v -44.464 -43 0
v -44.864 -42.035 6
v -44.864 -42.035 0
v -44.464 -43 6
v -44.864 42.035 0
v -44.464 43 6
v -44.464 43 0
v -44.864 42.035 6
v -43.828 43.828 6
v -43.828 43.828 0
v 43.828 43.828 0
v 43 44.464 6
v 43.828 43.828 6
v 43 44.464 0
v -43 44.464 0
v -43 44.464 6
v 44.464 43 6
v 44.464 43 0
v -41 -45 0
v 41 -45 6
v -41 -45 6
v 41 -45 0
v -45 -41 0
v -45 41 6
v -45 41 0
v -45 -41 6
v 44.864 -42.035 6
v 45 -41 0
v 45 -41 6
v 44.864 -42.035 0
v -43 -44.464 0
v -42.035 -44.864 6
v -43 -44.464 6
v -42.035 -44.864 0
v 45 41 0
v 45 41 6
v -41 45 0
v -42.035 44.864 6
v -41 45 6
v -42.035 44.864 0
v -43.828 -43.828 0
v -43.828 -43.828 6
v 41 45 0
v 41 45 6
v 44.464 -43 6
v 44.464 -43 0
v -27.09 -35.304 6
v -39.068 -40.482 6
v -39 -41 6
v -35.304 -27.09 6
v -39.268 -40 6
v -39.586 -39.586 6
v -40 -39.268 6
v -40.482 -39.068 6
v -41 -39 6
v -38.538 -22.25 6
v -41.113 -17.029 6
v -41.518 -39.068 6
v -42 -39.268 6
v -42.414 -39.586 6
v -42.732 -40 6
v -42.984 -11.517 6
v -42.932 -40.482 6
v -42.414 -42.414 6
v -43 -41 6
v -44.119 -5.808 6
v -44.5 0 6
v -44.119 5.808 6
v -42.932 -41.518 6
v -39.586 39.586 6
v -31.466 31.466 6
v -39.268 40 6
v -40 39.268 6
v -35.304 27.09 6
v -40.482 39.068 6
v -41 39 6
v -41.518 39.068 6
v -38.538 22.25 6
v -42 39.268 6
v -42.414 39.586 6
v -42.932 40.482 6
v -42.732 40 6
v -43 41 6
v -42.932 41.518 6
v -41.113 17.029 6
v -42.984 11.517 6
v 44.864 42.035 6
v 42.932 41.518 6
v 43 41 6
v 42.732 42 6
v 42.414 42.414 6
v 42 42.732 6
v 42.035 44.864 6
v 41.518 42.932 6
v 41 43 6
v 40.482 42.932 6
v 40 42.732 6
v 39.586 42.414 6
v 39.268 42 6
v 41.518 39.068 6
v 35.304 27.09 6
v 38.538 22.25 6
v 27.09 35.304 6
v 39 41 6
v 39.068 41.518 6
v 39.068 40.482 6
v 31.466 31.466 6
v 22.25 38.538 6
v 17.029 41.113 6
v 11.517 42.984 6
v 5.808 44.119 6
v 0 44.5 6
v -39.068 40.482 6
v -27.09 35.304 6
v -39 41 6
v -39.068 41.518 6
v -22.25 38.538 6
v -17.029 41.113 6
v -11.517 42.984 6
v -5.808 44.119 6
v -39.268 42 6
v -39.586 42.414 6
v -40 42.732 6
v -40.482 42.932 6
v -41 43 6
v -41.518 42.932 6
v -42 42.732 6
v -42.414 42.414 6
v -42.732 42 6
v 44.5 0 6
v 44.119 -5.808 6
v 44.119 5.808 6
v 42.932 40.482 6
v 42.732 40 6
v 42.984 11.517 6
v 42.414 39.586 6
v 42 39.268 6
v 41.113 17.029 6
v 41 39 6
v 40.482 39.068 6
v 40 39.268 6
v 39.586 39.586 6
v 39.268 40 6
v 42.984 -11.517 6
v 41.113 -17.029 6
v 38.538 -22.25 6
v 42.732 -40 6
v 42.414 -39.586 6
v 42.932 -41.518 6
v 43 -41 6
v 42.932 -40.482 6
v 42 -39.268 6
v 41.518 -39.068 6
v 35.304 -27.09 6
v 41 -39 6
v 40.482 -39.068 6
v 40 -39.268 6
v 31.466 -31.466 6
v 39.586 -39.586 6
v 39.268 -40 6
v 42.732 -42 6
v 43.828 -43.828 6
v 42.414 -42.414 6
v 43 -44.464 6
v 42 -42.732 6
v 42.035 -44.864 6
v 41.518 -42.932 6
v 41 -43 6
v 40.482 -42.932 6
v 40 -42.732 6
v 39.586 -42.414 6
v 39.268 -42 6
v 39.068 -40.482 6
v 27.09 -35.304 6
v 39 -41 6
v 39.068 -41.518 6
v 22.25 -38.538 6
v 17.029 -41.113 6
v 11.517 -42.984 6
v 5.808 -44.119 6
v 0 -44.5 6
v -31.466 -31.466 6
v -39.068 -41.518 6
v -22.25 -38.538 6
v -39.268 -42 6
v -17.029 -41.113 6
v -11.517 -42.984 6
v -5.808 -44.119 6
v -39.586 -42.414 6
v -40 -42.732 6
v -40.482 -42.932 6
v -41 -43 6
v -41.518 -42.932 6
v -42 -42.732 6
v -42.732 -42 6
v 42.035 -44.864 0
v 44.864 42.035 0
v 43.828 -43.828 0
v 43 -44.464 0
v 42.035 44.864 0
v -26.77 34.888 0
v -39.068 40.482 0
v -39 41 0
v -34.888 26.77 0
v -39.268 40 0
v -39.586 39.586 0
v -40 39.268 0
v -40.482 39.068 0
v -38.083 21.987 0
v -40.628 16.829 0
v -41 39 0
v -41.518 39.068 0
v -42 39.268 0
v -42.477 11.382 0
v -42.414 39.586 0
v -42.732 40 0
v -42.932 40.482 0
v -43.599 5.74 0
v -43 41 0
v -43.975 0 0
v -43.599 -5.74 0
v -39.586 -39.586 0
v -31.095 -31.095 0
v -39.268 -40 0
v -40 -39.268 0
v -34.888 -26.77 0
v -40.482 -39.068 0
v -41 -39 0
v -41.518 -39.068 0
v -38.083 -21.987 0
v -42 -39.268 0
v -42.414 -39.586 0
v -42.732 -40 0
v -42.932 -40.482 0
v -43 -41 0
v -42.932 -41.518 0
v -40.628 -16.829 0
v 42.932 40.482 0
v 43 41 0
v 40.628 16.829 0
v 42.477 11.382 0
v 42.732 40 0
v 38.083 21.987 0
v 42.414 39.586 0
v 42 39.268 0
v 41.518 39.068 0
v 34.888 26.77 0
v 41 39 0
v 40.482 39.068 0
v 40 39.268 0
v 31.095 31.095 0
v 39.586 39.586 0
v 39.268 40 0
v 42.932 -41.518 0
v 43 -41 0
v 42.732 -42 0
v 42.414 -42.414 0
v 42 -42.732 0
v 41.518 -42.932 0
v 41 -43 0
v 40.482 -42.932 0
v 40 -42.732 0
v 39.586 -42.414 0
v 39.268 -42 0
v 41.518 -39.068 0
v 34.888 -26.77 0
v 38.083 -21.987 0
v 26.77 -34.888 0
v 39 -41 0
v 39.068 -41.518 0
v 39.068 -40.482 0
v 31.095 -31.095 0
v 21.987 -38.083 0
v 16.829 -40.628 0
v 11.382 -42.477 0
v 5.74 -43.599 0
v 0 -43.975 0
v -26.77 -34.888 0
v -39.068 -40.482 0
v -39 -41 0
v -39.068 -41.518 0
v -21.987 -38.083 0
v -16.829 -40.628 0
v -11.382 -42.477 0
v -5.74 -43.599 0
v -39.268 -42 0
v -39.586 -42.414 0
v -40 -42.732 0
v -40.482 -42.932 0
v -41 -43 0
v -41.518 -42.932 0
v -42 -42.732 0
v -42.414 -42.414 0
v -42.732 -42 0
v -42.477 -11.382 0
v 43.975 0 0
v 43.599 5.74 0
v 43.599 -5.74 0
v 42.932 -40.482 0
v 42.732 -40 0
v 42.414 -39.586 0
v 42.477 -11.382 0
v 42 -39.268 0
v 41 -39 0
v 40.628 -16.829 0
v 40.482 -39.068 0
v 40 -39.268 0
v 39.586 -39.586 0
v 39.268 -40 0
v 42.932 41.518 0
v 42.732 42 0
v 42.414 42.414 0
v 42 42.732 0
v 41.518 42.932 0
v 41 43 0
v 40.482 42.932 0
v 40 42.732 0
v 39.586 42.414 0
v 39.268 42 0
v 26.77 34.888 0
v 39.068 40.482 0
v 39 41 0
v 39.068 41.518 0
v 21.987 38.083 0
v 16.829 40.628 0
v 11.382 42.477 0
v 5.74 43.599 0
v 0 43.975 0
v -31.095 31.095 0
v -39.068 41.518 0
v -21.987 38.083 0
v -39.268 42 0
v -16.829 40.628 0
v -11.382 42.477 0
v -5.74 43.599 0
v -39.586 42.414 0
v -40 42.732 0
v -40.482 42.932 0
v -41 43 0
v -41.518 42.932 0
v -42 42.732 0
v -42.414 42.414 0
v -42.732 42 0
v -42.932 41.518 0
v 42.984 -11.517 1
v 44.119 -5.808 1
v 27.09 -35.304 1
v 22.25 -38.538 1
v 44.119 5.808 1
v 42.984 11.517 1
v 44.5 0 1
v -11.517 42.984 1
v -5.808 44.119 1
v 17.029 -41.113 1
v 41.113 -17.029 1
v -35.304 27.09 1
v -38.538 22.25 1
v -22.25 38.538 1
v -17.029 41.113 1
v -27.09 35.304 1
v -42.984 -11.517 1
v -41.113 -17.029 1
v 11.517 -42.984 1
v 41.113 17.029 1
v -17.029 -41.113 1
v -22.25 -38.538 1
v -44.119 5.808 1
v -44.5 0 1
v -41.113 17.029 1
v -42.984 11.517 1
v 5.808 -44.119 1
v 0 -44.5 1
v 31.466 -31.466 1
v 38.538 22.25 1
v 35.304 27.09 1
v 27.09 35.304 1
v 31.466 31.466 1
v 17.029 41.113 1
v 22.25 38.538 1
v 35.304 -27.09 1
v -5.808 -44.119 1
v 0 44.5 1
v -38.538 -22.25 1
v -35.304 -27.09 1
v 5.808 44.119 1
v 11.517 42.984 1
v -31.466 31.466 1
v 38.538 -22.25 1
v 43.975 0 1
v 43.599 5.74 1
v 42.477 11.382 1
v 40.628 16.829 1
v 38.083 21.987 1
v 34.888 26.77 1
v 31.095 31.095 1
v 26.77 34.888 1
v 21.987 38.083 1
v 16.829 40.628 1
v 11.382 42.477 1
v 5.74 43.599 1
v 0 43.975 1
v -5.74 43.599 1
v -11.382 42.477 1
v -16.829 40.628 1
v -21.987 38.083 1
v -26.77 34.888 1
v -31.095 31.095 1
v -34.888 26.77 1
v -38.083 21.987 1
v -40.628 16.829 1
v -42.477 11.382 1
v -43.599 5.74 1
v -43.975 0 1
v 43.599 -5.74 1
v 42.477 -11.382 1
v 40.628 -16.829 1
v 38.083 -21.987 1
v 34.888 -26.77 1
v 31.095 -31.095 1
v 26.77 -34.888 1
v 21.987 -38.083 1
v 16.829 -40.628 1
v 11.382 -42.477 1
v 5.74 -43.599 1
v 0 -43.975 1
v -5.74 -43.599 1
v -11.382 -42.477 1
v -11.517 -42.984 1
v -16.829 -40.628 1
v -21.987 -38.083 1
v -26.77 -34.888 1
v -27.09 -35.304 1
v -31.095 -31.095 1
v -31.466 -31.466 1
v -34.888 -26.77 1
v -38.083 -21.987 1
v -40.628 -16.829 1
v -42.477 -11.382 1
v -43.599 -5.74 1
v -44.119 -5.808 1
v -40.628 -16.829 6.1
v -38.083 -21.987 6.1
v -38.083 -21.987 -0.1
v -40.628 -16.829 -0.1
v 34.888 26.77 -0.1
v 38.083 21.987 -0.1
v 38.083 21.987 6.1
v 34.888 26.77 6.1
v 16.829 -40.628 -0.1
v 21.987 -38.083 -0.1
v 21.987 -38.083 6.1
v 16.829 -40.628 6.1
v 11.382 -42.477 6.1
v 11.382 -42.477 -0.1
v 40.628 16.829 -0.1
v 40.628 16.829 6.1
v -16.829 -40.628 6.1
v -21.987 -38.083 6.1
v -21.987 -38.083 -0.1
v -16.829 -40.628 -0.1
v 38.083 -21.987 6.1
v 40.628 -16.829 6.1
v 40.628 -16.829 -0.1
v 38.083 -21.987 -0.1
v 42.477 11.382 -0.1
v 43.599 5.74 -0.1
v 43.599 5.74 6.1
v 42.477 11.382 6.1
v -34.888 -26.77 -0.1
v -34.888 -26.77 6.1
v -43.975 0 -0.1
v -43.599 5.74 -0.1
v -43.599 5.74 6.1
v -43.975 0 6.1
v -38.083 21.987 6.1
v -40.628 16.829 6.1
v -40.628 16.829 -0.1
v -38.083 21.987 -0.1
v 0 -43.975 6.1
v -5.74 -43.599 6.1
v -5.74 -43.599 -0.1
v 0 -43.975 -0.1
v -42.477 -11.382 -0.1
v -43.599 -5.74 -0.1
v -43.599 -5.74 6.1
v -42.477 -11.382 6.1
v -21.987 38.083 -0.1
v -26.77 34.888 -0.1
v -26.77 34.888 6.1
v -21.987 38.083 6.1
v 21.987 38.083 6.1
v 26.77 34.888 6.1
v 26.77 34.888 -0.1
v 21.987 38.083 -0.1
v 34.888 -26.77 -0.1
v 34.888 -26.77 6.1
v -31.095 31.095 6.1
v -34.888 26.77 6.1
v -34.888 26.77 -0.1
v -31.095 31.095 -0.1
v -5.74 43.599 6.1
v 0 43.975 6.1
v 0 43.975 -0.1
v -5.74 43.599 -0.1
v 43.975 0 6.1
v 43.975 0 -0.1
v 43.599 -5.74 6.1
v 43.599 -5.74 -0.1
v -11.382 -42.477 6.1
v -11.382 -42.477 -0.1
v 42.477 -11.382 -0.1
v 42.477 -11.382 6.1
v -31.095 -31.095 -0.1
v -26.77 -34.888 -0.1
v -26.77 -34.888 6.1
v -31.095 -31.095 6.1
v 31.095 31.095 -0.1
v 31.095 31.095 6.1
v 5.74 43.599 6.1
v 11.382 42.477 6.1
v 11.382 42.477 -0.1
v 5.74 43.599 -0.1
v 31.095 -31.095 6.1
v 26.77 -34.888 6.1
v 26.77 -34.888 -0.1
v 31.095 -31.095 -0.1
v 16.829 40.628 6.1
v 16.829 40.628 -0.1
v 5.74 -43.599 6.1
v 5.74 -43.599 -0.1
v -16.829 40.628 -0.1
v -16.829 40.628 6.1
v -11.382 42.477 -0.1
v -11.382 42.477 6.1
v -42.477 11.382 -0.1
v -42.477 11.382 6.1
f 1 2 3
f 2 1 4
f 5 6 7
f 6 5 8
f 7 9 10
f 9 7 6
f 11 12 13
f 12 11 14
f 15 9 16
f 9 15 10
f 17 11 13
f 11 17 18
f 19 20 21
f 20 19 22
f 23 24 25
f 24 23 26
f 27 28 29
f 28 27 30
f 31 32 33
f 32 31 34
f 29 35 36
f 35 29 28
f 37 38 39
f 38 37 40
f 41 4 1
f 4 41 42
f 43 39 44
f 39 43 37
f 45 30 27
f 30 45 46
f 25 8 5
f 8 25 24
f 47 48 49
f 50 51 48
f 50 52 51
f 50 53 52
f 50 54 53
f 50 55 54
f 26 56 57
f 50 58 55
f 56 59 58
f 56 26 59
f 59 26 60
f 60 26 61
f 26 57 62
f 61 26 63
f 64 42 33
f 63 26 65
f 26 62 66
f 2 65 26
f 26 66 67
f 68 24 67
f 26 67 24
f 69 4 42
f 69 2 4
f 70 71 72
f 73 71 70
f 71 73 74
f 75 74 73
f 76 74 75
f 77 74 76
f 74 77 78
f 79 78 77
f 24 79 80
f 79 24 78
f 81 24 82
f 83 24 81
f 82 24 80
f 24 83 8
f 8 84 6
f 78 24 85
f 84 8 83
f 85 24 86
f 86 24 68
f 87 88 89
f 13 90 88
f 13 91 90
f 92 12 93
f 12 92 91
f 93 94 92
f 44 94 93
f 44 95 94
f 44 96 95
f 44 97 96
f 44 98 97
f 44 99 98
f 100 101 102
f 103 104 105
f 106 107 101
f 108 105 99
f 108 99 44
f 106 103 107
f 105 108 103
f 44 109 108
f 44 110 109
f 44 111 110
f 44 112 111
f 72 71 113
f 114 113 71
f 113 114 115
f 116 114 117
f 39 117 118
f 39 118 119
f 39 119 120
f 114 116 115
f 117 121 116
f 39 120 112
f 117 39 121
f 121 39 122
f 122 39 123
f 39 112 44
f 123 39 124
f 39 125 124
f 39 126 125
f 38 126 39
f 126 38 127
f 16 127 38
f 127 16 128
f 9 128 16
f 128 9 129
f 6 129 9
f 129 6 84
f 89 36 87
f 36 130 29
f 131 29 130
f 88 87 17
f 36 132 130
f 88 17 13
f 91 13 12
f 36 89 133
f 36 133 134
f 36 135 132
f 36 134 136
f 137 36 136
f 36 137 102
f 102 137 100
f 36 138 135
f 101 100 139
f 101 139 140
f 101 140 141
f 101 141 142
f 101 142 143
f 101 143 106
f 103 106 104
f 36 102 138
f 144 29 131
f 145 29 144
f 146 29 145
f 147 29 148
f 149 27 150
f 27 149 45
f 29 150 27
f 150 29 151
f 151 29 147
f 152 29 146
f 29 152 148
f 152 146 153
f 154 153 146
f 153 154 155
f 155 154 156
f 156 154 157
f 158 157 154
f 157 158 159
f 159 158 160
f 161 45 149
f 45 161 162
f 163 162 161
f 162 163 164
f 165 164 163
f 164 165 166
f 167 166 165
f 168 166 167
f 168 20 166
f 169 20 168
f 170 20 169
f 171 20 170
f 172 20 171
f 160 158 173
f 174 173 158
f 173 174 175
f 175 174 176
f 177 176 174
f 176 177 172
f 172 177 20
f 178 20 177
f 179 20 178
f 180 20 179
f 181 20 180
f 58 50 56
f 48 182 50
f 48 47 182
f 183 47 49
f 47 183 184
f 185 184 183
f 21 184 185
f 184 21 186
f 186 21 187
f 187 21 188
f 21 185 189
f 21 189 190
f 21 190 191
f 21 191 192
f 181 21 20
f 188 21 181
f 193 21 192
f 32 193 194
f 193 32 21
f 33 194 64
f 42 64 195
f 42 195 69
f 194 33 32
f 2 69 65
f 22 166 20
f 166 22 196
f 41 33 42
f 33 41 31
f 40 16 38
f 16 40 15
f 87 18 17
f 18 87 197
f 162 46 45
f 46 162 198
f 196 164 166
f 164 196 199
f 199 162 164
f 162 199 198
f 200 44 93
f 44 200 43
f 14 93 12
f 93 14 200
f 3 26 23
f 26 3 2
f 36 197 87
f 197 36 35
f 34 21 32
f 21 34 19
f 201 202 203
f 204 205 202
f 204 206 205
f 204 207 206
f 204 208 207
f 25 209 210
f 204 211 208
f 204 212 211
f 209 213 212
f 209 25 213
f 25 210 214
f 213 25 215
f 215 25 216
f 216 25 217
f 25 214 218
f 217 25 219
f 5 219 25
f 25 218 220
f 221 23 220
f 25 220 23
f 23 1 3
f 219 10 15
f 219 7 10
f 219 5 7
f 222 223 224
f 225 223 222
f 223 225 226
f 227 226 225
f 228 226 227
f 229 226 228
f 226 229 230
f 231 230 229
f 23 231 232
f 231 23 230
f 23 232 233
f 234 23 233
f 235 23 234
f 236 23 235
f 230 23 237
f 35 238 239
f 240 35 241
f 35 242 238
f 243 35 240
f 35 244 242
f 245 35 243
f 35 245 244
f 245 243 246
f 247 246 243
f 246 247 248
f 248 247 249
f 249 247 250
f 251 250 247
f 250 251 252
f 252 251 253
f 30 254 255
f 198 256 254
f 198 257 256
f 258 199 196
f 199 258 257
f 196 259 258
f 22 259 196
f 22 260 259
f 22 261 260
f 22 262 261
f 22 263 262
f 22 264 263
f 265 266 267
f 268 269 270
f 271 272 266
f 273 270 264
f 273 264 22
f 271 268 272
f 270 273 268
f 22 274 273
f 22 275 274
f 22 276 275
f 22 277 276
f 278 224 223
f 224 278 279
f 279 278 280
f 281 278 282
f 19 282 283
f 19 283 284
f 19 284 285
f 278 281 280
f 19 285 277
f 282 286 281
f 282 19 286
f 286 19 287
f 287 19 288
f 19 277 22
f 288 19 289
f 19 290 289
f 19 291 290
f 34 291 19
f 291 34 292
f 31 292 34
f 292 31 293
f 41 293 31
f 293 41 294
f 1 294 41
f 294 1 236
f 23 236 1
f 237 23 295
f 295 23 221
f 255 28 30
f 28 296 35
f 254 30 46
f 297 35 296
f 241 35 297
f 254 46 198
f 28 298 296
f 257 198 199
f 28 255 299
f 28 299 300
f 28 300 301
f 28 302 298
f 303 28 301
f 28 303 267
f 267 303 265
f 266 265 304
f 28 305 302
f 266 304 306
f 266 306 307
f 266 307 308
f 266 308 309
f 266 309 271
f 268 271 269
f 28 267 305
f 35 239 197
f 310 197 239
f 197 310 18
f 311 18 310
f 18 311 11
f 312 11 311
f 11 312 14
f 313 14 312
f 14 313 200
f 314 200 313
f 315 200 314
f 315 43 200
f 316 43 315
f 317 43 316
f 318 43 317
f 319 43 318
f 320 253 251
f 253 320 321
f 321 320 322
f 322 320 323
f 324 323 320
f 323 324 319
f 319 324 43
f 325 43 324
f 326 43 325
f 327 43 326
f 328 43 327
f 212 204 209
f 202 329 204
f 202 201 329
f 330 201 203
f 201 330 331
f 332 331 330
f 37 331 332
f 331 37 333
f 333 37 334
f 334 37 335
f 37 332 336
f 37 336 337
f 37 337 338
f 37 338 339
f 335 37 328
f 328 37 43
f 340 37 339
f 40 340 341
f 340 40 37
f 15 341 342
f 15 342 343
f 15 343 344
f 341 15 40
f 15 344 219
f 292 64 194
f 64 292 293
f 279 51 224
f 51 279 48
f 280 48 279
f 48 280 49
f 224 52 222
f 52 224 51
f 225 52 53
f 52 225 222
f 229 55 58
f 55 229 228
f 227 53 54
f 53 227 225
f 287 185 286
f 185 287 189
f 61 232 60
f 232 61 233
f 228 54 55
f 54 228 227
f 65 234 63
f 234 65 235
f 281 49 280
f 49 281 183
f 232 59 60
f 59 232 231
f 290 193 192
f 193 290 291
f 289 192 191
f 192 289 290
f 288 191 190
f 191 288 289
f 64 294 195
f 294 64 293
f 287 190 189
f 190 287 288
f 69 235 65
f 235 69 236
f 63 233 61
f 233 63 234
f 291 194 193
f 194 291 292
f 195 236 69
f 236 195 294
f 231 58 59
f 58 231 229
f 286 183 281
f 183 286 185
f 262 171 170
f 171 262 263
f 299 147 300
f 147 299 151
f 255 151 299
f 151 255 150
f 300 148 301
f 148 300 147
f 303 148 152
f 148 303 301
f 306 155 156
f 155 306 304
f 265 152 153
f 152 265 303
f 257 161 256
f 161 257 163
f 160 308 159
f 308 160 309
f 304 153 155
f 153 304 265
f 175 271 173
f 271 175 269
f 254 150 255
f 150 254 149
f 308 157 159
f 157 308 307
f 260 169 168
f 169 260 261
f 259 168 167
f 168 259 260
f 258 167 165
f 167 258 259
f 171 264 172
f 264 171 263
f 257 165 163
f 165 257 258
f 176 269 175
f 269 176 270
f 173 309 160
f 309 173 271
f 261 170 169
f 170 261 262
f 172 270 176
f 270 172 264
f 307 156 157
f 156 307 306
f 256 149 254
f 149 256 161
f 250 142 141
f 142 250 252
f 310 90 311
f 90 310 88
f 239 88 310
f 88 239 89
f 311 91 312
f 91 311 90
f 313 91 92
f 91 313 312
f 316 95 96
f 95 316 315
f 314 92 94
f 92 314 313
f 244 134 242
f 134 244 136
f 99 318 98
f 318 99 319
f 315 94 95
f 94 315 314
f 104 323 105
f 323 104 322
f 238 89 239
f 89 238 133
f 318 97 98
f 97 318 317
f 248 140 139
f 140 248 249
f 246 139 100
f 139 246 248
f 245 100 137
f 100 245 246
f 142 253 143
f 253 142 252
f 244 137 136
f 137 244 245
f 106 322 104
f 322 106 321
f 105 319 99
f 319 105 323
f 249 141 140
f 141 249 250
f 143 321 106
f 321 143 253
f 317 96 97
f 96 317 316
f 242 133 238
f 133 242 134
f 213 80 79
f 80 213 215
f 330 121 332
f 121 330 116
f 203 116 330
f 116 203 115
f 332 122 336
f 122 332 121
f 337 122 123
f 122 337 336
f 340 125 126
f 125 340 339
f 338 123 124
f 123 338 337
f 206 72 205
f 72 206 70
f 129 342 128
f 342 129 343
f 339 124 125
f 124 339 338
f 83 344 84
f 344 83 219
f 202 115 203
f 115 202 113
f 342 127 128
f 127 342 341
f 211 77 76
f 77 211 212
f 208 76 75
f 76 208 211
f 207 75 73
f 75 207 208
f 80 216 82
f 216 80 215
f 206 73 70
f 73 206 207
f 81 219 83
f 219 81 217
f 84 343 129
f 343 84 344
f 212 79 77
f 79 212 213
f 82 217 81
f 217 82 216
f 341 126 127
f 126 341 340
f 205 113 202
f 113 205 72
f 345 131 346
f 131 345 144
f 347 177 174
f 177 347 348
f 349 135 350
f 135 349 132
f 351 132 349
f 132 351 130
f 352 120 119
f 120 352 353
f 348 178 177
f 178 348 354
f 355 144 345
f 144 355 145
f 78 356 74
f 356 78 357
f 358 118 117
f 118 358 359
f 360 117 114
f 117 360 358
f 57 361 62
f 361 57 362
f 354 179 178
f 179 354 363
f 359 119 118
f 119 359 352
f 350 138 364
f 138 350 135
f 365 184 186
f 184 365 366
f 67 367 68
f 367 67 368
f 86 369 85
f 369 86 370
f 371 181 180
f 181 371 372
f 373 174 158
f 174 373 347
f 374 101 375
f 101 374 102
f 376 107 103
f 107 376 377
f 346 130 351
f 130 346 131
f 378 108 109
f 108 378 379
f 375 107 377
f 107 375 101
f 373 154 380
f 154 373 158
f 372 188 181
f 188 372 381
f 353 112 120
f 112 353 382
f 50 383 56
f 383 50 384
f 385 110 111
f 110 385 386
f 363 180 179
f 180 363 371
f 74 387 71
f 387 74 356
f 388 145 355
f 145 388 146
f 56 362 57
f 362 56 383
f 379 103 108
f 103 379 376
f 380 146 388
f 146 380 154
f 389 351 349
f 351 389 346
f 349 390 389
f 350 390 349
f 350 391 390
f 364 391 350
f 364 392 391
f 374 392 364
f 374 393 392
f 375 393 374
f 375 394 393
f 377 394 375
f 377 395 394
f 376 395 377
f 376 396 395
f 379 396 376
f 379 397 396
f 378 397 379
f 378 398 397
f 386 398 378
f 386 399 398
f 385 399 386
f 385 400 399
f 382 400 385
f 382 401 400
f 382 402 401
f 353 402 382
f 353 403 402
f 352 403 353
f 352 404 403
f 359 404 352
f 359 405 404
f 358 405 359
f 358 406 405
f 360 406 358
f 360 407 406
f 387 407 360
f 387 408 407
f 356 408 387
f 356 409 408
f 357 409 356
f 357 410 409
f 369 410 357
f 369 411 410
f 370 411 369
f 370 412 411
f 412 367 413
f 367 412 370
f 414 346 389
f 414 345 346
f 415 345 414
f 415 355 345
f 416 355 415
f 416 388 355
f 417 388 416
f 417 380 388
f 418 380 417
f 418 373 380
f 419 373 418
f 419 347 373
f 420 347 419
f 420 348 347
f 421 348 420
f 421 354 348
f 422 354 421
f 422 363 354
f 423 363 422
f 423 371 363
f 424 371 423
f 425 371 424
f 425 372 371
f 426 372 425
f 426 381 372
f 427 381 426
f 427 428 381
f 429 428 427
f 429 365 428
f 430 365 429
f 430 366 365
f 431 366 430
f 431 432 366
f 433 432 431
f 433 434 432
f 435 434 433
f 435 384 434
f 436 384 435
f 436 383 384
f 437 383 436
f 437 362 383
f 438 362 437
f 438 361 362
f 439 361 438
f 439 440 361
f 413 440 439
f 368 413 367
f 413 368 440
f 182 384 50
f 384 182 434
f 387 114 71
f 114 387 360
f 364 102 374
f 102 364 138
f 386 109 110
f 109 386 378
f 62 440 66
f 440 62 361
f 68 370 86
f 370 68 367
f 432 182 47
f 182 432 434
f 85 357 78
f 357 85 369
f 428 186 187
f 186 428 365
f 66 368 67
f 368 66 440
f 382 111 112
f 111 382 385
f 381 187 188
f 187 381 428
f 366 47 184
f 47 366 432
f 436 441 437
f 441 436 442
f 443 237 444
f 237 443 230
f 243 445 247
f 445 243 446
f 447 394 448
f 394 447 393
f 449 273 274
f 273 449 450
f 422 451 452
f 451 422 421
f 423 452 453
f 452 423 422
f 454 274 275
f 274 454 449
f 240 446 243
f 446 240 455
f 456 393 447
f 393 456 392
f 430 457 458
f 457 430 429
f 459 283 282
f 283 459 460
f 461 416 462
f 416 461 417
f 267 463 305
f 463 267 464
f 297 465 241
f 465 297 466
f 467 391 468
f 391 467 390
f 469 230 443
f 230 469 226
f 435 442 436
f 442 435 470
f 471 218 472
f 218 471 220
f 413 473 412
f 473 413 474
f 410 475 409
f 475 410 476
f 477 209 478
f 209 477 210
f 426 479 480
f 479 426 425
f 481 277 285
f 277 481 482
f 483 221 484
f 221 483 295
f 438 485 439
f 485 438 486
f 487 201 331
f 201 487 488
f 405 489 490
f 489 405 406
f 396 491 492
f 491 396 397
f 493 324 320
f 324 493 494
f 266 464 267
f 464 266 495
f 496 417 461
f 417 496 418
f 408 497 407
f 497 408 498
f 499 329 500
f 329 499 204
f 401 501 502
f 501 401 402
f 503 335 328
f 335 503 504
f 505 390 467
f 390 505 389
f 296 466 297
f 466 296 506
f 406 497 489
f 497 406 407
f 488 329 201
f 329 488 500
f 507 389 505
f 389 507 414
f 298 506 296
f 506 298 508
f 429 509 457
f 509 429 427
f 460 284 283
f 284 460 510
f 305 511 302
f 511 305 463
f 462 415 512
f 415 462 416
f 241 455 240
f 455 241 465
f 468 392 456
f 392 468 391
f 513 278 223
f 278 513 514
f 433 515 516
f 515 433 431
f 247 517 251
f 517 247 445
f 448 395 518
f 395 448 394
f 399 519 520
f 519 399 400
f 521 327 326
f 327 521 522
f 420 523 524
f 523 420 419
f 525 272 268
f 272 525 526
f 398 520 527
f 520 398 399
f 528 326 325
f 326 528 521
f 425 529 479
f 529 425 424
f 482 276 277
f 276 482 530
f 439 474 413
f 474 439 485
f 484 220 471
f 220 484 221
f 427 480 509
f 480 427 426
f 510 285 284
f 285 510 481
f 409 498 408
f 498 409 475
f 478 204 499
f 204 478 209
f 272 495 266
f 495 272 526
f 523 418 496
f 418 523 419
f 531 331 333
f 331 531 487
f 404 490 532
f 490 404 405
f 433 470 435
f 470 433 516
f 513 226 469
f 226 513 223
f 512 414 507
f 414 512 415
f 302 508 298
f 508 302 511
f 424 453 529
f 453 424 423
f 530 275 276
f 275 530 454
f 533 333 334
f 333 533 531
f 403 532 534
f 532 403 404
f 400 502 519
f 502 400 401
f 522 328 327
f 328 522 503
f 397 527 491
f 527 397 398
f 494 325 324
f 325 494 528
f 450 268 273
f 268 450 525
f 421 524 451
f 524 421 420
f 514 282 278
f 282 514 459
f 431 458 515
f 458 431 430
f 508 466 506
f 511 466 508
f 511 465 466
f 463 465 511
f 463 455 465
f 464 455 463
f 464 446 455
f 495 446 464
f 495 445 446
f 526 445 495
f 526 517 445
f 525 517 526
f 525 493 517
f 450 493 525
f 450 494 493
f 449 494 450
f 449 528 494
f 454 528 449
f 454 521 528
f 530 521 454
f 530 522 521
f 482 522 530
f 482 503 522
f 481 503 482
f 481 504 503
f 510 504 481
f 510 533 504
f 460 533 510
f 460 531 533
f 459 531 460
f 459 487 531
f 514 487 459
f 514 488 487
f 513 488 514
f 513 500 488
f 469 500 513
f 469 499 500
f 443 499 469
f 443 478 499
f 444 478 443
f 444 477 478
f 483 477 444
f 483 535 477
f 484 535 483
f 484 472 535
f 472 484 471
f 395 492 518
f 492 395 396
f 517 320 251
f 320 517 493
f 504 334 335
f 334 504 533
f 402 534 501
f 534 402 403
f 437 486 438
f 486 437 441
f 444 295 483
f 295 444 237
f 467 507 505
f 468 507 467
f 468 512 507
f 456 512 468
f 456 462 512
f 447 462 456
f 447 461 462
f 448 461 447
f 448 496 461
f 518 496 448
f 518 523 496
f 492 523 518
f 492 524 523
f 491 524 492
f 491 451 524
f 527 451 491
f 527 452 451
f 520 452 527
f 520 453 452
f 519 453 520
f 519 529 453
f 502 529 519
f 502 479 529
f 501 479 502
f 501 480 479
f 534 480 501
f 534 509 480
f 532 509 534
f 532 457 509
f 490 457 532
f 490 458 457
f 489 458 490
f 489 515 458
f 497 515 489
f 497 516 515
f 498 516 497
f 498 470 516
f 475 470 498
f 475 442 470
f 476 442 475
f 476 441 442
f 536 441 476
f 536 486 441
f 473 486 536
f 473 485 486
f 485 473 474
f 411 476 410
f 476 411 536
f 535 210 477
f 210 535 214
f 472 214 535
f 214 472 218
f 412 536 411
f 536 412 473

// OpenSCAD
// file: ../OpenSCAD_Modules/boards.scad
module board(
	size_x=50,
	size_y=50,
	width=1.5,
	hole_diam=3,
	rounding=1,
	hole1=[3,3],
	hole2=[3,3],
	hole3=[3,3],
	hole4=[3,3],
	center_xy=false,
	center_z=false,
	board_color=[0.3,0.5,0.3],
	quality=2, //integer from 1 to infinity
)
{
	assert(size_x>0);
	assert(size_y>0);
	assert(width>0);
	assert(hole_diam>0);
	assert(rounding>0);
	assert(rounding<=size_x/2);
	assert(rounding<=size_y/2);
	assert(quality>0)

	color(board_color)
		translate([center_xy?-size_x/2:0,center_xy?-size_y/2:0,center_z?-width/2:0])
			difference()
			{
				//base
				translate([rounding,rounding])
					resize([size_x,size_y,width])
						minkowski()
						{
							cube([size_x-rounding*2,size_y-rounding*2,width]);
							cylinder(r=rounding,h=width,$fn=12*quality);
						};
				//holes
				if(hole1!=false && len(hole1)==2)
					translate([hole1[0],hole1[1],-width/2])
						cylinder(r=hole_diam/2,h=width*2,$fn=12*quality);
				if(hole2!=false && len(hole2)==2)
					translate([size_x-hole2[0],hole2[1],-width/2])
						cylinder(r=hole_diam/2,h=width*2,$fn=12*quality);
				if(hole3!=false && len(hole3)==2)
					translate([size_x-hole3[0],size_y-hole3[1],-width/2])
						cylinder(r=hole_diam/2,h=width*2,$fn=12*quality);
				if(hole4!=false && len(hole4)==2)
					translate([hole4[0],size_y-hole4[1],-width/2])
						cylinder(r=hole_diam/2,h=width*2,$fn=12*quality);
			}
}

//example
board(size_x=30,size_y=80,hole1=[15,3],hole2=false,center_xy=true,center_z=true,rounding=3);
// main file
use <../OpenSCAD_Modules/boards.scad>

module fan_cover(
	size=90,
	fan_diam=89,
	hole_diam=4,
	hole_shift=4,
	base=1,
	height=6,
	quality=2, //integer from 1 to infinity
)
{
	difference()
	{
		board(size_x=size,size_y=size,hole_diam=hole_diam,hole1=[hole_shift,hole_shift],hole2=[hole_shift,hole_shift],hole3=[hole_shift,hole_shift],hole4=[hole_shift,hole_shift],rounding=hole_shift,width=height,center_xy=true,center_z=false);
		translate([0,0,base])
			cylinder(d=fan_diam,h=height-base+0.1,$fn=24*quality);
	}
}

module fan_cut(
	fan_diam=88,
	height=6,
	quality=2, //integer from 1 to infinity
)
{
	translate([0,0,-0.1])
		cylinder(d=fan_diam-0.05,h=height+0.2,$fn=24*quality);
}

fan_cover();
fan_cut();
